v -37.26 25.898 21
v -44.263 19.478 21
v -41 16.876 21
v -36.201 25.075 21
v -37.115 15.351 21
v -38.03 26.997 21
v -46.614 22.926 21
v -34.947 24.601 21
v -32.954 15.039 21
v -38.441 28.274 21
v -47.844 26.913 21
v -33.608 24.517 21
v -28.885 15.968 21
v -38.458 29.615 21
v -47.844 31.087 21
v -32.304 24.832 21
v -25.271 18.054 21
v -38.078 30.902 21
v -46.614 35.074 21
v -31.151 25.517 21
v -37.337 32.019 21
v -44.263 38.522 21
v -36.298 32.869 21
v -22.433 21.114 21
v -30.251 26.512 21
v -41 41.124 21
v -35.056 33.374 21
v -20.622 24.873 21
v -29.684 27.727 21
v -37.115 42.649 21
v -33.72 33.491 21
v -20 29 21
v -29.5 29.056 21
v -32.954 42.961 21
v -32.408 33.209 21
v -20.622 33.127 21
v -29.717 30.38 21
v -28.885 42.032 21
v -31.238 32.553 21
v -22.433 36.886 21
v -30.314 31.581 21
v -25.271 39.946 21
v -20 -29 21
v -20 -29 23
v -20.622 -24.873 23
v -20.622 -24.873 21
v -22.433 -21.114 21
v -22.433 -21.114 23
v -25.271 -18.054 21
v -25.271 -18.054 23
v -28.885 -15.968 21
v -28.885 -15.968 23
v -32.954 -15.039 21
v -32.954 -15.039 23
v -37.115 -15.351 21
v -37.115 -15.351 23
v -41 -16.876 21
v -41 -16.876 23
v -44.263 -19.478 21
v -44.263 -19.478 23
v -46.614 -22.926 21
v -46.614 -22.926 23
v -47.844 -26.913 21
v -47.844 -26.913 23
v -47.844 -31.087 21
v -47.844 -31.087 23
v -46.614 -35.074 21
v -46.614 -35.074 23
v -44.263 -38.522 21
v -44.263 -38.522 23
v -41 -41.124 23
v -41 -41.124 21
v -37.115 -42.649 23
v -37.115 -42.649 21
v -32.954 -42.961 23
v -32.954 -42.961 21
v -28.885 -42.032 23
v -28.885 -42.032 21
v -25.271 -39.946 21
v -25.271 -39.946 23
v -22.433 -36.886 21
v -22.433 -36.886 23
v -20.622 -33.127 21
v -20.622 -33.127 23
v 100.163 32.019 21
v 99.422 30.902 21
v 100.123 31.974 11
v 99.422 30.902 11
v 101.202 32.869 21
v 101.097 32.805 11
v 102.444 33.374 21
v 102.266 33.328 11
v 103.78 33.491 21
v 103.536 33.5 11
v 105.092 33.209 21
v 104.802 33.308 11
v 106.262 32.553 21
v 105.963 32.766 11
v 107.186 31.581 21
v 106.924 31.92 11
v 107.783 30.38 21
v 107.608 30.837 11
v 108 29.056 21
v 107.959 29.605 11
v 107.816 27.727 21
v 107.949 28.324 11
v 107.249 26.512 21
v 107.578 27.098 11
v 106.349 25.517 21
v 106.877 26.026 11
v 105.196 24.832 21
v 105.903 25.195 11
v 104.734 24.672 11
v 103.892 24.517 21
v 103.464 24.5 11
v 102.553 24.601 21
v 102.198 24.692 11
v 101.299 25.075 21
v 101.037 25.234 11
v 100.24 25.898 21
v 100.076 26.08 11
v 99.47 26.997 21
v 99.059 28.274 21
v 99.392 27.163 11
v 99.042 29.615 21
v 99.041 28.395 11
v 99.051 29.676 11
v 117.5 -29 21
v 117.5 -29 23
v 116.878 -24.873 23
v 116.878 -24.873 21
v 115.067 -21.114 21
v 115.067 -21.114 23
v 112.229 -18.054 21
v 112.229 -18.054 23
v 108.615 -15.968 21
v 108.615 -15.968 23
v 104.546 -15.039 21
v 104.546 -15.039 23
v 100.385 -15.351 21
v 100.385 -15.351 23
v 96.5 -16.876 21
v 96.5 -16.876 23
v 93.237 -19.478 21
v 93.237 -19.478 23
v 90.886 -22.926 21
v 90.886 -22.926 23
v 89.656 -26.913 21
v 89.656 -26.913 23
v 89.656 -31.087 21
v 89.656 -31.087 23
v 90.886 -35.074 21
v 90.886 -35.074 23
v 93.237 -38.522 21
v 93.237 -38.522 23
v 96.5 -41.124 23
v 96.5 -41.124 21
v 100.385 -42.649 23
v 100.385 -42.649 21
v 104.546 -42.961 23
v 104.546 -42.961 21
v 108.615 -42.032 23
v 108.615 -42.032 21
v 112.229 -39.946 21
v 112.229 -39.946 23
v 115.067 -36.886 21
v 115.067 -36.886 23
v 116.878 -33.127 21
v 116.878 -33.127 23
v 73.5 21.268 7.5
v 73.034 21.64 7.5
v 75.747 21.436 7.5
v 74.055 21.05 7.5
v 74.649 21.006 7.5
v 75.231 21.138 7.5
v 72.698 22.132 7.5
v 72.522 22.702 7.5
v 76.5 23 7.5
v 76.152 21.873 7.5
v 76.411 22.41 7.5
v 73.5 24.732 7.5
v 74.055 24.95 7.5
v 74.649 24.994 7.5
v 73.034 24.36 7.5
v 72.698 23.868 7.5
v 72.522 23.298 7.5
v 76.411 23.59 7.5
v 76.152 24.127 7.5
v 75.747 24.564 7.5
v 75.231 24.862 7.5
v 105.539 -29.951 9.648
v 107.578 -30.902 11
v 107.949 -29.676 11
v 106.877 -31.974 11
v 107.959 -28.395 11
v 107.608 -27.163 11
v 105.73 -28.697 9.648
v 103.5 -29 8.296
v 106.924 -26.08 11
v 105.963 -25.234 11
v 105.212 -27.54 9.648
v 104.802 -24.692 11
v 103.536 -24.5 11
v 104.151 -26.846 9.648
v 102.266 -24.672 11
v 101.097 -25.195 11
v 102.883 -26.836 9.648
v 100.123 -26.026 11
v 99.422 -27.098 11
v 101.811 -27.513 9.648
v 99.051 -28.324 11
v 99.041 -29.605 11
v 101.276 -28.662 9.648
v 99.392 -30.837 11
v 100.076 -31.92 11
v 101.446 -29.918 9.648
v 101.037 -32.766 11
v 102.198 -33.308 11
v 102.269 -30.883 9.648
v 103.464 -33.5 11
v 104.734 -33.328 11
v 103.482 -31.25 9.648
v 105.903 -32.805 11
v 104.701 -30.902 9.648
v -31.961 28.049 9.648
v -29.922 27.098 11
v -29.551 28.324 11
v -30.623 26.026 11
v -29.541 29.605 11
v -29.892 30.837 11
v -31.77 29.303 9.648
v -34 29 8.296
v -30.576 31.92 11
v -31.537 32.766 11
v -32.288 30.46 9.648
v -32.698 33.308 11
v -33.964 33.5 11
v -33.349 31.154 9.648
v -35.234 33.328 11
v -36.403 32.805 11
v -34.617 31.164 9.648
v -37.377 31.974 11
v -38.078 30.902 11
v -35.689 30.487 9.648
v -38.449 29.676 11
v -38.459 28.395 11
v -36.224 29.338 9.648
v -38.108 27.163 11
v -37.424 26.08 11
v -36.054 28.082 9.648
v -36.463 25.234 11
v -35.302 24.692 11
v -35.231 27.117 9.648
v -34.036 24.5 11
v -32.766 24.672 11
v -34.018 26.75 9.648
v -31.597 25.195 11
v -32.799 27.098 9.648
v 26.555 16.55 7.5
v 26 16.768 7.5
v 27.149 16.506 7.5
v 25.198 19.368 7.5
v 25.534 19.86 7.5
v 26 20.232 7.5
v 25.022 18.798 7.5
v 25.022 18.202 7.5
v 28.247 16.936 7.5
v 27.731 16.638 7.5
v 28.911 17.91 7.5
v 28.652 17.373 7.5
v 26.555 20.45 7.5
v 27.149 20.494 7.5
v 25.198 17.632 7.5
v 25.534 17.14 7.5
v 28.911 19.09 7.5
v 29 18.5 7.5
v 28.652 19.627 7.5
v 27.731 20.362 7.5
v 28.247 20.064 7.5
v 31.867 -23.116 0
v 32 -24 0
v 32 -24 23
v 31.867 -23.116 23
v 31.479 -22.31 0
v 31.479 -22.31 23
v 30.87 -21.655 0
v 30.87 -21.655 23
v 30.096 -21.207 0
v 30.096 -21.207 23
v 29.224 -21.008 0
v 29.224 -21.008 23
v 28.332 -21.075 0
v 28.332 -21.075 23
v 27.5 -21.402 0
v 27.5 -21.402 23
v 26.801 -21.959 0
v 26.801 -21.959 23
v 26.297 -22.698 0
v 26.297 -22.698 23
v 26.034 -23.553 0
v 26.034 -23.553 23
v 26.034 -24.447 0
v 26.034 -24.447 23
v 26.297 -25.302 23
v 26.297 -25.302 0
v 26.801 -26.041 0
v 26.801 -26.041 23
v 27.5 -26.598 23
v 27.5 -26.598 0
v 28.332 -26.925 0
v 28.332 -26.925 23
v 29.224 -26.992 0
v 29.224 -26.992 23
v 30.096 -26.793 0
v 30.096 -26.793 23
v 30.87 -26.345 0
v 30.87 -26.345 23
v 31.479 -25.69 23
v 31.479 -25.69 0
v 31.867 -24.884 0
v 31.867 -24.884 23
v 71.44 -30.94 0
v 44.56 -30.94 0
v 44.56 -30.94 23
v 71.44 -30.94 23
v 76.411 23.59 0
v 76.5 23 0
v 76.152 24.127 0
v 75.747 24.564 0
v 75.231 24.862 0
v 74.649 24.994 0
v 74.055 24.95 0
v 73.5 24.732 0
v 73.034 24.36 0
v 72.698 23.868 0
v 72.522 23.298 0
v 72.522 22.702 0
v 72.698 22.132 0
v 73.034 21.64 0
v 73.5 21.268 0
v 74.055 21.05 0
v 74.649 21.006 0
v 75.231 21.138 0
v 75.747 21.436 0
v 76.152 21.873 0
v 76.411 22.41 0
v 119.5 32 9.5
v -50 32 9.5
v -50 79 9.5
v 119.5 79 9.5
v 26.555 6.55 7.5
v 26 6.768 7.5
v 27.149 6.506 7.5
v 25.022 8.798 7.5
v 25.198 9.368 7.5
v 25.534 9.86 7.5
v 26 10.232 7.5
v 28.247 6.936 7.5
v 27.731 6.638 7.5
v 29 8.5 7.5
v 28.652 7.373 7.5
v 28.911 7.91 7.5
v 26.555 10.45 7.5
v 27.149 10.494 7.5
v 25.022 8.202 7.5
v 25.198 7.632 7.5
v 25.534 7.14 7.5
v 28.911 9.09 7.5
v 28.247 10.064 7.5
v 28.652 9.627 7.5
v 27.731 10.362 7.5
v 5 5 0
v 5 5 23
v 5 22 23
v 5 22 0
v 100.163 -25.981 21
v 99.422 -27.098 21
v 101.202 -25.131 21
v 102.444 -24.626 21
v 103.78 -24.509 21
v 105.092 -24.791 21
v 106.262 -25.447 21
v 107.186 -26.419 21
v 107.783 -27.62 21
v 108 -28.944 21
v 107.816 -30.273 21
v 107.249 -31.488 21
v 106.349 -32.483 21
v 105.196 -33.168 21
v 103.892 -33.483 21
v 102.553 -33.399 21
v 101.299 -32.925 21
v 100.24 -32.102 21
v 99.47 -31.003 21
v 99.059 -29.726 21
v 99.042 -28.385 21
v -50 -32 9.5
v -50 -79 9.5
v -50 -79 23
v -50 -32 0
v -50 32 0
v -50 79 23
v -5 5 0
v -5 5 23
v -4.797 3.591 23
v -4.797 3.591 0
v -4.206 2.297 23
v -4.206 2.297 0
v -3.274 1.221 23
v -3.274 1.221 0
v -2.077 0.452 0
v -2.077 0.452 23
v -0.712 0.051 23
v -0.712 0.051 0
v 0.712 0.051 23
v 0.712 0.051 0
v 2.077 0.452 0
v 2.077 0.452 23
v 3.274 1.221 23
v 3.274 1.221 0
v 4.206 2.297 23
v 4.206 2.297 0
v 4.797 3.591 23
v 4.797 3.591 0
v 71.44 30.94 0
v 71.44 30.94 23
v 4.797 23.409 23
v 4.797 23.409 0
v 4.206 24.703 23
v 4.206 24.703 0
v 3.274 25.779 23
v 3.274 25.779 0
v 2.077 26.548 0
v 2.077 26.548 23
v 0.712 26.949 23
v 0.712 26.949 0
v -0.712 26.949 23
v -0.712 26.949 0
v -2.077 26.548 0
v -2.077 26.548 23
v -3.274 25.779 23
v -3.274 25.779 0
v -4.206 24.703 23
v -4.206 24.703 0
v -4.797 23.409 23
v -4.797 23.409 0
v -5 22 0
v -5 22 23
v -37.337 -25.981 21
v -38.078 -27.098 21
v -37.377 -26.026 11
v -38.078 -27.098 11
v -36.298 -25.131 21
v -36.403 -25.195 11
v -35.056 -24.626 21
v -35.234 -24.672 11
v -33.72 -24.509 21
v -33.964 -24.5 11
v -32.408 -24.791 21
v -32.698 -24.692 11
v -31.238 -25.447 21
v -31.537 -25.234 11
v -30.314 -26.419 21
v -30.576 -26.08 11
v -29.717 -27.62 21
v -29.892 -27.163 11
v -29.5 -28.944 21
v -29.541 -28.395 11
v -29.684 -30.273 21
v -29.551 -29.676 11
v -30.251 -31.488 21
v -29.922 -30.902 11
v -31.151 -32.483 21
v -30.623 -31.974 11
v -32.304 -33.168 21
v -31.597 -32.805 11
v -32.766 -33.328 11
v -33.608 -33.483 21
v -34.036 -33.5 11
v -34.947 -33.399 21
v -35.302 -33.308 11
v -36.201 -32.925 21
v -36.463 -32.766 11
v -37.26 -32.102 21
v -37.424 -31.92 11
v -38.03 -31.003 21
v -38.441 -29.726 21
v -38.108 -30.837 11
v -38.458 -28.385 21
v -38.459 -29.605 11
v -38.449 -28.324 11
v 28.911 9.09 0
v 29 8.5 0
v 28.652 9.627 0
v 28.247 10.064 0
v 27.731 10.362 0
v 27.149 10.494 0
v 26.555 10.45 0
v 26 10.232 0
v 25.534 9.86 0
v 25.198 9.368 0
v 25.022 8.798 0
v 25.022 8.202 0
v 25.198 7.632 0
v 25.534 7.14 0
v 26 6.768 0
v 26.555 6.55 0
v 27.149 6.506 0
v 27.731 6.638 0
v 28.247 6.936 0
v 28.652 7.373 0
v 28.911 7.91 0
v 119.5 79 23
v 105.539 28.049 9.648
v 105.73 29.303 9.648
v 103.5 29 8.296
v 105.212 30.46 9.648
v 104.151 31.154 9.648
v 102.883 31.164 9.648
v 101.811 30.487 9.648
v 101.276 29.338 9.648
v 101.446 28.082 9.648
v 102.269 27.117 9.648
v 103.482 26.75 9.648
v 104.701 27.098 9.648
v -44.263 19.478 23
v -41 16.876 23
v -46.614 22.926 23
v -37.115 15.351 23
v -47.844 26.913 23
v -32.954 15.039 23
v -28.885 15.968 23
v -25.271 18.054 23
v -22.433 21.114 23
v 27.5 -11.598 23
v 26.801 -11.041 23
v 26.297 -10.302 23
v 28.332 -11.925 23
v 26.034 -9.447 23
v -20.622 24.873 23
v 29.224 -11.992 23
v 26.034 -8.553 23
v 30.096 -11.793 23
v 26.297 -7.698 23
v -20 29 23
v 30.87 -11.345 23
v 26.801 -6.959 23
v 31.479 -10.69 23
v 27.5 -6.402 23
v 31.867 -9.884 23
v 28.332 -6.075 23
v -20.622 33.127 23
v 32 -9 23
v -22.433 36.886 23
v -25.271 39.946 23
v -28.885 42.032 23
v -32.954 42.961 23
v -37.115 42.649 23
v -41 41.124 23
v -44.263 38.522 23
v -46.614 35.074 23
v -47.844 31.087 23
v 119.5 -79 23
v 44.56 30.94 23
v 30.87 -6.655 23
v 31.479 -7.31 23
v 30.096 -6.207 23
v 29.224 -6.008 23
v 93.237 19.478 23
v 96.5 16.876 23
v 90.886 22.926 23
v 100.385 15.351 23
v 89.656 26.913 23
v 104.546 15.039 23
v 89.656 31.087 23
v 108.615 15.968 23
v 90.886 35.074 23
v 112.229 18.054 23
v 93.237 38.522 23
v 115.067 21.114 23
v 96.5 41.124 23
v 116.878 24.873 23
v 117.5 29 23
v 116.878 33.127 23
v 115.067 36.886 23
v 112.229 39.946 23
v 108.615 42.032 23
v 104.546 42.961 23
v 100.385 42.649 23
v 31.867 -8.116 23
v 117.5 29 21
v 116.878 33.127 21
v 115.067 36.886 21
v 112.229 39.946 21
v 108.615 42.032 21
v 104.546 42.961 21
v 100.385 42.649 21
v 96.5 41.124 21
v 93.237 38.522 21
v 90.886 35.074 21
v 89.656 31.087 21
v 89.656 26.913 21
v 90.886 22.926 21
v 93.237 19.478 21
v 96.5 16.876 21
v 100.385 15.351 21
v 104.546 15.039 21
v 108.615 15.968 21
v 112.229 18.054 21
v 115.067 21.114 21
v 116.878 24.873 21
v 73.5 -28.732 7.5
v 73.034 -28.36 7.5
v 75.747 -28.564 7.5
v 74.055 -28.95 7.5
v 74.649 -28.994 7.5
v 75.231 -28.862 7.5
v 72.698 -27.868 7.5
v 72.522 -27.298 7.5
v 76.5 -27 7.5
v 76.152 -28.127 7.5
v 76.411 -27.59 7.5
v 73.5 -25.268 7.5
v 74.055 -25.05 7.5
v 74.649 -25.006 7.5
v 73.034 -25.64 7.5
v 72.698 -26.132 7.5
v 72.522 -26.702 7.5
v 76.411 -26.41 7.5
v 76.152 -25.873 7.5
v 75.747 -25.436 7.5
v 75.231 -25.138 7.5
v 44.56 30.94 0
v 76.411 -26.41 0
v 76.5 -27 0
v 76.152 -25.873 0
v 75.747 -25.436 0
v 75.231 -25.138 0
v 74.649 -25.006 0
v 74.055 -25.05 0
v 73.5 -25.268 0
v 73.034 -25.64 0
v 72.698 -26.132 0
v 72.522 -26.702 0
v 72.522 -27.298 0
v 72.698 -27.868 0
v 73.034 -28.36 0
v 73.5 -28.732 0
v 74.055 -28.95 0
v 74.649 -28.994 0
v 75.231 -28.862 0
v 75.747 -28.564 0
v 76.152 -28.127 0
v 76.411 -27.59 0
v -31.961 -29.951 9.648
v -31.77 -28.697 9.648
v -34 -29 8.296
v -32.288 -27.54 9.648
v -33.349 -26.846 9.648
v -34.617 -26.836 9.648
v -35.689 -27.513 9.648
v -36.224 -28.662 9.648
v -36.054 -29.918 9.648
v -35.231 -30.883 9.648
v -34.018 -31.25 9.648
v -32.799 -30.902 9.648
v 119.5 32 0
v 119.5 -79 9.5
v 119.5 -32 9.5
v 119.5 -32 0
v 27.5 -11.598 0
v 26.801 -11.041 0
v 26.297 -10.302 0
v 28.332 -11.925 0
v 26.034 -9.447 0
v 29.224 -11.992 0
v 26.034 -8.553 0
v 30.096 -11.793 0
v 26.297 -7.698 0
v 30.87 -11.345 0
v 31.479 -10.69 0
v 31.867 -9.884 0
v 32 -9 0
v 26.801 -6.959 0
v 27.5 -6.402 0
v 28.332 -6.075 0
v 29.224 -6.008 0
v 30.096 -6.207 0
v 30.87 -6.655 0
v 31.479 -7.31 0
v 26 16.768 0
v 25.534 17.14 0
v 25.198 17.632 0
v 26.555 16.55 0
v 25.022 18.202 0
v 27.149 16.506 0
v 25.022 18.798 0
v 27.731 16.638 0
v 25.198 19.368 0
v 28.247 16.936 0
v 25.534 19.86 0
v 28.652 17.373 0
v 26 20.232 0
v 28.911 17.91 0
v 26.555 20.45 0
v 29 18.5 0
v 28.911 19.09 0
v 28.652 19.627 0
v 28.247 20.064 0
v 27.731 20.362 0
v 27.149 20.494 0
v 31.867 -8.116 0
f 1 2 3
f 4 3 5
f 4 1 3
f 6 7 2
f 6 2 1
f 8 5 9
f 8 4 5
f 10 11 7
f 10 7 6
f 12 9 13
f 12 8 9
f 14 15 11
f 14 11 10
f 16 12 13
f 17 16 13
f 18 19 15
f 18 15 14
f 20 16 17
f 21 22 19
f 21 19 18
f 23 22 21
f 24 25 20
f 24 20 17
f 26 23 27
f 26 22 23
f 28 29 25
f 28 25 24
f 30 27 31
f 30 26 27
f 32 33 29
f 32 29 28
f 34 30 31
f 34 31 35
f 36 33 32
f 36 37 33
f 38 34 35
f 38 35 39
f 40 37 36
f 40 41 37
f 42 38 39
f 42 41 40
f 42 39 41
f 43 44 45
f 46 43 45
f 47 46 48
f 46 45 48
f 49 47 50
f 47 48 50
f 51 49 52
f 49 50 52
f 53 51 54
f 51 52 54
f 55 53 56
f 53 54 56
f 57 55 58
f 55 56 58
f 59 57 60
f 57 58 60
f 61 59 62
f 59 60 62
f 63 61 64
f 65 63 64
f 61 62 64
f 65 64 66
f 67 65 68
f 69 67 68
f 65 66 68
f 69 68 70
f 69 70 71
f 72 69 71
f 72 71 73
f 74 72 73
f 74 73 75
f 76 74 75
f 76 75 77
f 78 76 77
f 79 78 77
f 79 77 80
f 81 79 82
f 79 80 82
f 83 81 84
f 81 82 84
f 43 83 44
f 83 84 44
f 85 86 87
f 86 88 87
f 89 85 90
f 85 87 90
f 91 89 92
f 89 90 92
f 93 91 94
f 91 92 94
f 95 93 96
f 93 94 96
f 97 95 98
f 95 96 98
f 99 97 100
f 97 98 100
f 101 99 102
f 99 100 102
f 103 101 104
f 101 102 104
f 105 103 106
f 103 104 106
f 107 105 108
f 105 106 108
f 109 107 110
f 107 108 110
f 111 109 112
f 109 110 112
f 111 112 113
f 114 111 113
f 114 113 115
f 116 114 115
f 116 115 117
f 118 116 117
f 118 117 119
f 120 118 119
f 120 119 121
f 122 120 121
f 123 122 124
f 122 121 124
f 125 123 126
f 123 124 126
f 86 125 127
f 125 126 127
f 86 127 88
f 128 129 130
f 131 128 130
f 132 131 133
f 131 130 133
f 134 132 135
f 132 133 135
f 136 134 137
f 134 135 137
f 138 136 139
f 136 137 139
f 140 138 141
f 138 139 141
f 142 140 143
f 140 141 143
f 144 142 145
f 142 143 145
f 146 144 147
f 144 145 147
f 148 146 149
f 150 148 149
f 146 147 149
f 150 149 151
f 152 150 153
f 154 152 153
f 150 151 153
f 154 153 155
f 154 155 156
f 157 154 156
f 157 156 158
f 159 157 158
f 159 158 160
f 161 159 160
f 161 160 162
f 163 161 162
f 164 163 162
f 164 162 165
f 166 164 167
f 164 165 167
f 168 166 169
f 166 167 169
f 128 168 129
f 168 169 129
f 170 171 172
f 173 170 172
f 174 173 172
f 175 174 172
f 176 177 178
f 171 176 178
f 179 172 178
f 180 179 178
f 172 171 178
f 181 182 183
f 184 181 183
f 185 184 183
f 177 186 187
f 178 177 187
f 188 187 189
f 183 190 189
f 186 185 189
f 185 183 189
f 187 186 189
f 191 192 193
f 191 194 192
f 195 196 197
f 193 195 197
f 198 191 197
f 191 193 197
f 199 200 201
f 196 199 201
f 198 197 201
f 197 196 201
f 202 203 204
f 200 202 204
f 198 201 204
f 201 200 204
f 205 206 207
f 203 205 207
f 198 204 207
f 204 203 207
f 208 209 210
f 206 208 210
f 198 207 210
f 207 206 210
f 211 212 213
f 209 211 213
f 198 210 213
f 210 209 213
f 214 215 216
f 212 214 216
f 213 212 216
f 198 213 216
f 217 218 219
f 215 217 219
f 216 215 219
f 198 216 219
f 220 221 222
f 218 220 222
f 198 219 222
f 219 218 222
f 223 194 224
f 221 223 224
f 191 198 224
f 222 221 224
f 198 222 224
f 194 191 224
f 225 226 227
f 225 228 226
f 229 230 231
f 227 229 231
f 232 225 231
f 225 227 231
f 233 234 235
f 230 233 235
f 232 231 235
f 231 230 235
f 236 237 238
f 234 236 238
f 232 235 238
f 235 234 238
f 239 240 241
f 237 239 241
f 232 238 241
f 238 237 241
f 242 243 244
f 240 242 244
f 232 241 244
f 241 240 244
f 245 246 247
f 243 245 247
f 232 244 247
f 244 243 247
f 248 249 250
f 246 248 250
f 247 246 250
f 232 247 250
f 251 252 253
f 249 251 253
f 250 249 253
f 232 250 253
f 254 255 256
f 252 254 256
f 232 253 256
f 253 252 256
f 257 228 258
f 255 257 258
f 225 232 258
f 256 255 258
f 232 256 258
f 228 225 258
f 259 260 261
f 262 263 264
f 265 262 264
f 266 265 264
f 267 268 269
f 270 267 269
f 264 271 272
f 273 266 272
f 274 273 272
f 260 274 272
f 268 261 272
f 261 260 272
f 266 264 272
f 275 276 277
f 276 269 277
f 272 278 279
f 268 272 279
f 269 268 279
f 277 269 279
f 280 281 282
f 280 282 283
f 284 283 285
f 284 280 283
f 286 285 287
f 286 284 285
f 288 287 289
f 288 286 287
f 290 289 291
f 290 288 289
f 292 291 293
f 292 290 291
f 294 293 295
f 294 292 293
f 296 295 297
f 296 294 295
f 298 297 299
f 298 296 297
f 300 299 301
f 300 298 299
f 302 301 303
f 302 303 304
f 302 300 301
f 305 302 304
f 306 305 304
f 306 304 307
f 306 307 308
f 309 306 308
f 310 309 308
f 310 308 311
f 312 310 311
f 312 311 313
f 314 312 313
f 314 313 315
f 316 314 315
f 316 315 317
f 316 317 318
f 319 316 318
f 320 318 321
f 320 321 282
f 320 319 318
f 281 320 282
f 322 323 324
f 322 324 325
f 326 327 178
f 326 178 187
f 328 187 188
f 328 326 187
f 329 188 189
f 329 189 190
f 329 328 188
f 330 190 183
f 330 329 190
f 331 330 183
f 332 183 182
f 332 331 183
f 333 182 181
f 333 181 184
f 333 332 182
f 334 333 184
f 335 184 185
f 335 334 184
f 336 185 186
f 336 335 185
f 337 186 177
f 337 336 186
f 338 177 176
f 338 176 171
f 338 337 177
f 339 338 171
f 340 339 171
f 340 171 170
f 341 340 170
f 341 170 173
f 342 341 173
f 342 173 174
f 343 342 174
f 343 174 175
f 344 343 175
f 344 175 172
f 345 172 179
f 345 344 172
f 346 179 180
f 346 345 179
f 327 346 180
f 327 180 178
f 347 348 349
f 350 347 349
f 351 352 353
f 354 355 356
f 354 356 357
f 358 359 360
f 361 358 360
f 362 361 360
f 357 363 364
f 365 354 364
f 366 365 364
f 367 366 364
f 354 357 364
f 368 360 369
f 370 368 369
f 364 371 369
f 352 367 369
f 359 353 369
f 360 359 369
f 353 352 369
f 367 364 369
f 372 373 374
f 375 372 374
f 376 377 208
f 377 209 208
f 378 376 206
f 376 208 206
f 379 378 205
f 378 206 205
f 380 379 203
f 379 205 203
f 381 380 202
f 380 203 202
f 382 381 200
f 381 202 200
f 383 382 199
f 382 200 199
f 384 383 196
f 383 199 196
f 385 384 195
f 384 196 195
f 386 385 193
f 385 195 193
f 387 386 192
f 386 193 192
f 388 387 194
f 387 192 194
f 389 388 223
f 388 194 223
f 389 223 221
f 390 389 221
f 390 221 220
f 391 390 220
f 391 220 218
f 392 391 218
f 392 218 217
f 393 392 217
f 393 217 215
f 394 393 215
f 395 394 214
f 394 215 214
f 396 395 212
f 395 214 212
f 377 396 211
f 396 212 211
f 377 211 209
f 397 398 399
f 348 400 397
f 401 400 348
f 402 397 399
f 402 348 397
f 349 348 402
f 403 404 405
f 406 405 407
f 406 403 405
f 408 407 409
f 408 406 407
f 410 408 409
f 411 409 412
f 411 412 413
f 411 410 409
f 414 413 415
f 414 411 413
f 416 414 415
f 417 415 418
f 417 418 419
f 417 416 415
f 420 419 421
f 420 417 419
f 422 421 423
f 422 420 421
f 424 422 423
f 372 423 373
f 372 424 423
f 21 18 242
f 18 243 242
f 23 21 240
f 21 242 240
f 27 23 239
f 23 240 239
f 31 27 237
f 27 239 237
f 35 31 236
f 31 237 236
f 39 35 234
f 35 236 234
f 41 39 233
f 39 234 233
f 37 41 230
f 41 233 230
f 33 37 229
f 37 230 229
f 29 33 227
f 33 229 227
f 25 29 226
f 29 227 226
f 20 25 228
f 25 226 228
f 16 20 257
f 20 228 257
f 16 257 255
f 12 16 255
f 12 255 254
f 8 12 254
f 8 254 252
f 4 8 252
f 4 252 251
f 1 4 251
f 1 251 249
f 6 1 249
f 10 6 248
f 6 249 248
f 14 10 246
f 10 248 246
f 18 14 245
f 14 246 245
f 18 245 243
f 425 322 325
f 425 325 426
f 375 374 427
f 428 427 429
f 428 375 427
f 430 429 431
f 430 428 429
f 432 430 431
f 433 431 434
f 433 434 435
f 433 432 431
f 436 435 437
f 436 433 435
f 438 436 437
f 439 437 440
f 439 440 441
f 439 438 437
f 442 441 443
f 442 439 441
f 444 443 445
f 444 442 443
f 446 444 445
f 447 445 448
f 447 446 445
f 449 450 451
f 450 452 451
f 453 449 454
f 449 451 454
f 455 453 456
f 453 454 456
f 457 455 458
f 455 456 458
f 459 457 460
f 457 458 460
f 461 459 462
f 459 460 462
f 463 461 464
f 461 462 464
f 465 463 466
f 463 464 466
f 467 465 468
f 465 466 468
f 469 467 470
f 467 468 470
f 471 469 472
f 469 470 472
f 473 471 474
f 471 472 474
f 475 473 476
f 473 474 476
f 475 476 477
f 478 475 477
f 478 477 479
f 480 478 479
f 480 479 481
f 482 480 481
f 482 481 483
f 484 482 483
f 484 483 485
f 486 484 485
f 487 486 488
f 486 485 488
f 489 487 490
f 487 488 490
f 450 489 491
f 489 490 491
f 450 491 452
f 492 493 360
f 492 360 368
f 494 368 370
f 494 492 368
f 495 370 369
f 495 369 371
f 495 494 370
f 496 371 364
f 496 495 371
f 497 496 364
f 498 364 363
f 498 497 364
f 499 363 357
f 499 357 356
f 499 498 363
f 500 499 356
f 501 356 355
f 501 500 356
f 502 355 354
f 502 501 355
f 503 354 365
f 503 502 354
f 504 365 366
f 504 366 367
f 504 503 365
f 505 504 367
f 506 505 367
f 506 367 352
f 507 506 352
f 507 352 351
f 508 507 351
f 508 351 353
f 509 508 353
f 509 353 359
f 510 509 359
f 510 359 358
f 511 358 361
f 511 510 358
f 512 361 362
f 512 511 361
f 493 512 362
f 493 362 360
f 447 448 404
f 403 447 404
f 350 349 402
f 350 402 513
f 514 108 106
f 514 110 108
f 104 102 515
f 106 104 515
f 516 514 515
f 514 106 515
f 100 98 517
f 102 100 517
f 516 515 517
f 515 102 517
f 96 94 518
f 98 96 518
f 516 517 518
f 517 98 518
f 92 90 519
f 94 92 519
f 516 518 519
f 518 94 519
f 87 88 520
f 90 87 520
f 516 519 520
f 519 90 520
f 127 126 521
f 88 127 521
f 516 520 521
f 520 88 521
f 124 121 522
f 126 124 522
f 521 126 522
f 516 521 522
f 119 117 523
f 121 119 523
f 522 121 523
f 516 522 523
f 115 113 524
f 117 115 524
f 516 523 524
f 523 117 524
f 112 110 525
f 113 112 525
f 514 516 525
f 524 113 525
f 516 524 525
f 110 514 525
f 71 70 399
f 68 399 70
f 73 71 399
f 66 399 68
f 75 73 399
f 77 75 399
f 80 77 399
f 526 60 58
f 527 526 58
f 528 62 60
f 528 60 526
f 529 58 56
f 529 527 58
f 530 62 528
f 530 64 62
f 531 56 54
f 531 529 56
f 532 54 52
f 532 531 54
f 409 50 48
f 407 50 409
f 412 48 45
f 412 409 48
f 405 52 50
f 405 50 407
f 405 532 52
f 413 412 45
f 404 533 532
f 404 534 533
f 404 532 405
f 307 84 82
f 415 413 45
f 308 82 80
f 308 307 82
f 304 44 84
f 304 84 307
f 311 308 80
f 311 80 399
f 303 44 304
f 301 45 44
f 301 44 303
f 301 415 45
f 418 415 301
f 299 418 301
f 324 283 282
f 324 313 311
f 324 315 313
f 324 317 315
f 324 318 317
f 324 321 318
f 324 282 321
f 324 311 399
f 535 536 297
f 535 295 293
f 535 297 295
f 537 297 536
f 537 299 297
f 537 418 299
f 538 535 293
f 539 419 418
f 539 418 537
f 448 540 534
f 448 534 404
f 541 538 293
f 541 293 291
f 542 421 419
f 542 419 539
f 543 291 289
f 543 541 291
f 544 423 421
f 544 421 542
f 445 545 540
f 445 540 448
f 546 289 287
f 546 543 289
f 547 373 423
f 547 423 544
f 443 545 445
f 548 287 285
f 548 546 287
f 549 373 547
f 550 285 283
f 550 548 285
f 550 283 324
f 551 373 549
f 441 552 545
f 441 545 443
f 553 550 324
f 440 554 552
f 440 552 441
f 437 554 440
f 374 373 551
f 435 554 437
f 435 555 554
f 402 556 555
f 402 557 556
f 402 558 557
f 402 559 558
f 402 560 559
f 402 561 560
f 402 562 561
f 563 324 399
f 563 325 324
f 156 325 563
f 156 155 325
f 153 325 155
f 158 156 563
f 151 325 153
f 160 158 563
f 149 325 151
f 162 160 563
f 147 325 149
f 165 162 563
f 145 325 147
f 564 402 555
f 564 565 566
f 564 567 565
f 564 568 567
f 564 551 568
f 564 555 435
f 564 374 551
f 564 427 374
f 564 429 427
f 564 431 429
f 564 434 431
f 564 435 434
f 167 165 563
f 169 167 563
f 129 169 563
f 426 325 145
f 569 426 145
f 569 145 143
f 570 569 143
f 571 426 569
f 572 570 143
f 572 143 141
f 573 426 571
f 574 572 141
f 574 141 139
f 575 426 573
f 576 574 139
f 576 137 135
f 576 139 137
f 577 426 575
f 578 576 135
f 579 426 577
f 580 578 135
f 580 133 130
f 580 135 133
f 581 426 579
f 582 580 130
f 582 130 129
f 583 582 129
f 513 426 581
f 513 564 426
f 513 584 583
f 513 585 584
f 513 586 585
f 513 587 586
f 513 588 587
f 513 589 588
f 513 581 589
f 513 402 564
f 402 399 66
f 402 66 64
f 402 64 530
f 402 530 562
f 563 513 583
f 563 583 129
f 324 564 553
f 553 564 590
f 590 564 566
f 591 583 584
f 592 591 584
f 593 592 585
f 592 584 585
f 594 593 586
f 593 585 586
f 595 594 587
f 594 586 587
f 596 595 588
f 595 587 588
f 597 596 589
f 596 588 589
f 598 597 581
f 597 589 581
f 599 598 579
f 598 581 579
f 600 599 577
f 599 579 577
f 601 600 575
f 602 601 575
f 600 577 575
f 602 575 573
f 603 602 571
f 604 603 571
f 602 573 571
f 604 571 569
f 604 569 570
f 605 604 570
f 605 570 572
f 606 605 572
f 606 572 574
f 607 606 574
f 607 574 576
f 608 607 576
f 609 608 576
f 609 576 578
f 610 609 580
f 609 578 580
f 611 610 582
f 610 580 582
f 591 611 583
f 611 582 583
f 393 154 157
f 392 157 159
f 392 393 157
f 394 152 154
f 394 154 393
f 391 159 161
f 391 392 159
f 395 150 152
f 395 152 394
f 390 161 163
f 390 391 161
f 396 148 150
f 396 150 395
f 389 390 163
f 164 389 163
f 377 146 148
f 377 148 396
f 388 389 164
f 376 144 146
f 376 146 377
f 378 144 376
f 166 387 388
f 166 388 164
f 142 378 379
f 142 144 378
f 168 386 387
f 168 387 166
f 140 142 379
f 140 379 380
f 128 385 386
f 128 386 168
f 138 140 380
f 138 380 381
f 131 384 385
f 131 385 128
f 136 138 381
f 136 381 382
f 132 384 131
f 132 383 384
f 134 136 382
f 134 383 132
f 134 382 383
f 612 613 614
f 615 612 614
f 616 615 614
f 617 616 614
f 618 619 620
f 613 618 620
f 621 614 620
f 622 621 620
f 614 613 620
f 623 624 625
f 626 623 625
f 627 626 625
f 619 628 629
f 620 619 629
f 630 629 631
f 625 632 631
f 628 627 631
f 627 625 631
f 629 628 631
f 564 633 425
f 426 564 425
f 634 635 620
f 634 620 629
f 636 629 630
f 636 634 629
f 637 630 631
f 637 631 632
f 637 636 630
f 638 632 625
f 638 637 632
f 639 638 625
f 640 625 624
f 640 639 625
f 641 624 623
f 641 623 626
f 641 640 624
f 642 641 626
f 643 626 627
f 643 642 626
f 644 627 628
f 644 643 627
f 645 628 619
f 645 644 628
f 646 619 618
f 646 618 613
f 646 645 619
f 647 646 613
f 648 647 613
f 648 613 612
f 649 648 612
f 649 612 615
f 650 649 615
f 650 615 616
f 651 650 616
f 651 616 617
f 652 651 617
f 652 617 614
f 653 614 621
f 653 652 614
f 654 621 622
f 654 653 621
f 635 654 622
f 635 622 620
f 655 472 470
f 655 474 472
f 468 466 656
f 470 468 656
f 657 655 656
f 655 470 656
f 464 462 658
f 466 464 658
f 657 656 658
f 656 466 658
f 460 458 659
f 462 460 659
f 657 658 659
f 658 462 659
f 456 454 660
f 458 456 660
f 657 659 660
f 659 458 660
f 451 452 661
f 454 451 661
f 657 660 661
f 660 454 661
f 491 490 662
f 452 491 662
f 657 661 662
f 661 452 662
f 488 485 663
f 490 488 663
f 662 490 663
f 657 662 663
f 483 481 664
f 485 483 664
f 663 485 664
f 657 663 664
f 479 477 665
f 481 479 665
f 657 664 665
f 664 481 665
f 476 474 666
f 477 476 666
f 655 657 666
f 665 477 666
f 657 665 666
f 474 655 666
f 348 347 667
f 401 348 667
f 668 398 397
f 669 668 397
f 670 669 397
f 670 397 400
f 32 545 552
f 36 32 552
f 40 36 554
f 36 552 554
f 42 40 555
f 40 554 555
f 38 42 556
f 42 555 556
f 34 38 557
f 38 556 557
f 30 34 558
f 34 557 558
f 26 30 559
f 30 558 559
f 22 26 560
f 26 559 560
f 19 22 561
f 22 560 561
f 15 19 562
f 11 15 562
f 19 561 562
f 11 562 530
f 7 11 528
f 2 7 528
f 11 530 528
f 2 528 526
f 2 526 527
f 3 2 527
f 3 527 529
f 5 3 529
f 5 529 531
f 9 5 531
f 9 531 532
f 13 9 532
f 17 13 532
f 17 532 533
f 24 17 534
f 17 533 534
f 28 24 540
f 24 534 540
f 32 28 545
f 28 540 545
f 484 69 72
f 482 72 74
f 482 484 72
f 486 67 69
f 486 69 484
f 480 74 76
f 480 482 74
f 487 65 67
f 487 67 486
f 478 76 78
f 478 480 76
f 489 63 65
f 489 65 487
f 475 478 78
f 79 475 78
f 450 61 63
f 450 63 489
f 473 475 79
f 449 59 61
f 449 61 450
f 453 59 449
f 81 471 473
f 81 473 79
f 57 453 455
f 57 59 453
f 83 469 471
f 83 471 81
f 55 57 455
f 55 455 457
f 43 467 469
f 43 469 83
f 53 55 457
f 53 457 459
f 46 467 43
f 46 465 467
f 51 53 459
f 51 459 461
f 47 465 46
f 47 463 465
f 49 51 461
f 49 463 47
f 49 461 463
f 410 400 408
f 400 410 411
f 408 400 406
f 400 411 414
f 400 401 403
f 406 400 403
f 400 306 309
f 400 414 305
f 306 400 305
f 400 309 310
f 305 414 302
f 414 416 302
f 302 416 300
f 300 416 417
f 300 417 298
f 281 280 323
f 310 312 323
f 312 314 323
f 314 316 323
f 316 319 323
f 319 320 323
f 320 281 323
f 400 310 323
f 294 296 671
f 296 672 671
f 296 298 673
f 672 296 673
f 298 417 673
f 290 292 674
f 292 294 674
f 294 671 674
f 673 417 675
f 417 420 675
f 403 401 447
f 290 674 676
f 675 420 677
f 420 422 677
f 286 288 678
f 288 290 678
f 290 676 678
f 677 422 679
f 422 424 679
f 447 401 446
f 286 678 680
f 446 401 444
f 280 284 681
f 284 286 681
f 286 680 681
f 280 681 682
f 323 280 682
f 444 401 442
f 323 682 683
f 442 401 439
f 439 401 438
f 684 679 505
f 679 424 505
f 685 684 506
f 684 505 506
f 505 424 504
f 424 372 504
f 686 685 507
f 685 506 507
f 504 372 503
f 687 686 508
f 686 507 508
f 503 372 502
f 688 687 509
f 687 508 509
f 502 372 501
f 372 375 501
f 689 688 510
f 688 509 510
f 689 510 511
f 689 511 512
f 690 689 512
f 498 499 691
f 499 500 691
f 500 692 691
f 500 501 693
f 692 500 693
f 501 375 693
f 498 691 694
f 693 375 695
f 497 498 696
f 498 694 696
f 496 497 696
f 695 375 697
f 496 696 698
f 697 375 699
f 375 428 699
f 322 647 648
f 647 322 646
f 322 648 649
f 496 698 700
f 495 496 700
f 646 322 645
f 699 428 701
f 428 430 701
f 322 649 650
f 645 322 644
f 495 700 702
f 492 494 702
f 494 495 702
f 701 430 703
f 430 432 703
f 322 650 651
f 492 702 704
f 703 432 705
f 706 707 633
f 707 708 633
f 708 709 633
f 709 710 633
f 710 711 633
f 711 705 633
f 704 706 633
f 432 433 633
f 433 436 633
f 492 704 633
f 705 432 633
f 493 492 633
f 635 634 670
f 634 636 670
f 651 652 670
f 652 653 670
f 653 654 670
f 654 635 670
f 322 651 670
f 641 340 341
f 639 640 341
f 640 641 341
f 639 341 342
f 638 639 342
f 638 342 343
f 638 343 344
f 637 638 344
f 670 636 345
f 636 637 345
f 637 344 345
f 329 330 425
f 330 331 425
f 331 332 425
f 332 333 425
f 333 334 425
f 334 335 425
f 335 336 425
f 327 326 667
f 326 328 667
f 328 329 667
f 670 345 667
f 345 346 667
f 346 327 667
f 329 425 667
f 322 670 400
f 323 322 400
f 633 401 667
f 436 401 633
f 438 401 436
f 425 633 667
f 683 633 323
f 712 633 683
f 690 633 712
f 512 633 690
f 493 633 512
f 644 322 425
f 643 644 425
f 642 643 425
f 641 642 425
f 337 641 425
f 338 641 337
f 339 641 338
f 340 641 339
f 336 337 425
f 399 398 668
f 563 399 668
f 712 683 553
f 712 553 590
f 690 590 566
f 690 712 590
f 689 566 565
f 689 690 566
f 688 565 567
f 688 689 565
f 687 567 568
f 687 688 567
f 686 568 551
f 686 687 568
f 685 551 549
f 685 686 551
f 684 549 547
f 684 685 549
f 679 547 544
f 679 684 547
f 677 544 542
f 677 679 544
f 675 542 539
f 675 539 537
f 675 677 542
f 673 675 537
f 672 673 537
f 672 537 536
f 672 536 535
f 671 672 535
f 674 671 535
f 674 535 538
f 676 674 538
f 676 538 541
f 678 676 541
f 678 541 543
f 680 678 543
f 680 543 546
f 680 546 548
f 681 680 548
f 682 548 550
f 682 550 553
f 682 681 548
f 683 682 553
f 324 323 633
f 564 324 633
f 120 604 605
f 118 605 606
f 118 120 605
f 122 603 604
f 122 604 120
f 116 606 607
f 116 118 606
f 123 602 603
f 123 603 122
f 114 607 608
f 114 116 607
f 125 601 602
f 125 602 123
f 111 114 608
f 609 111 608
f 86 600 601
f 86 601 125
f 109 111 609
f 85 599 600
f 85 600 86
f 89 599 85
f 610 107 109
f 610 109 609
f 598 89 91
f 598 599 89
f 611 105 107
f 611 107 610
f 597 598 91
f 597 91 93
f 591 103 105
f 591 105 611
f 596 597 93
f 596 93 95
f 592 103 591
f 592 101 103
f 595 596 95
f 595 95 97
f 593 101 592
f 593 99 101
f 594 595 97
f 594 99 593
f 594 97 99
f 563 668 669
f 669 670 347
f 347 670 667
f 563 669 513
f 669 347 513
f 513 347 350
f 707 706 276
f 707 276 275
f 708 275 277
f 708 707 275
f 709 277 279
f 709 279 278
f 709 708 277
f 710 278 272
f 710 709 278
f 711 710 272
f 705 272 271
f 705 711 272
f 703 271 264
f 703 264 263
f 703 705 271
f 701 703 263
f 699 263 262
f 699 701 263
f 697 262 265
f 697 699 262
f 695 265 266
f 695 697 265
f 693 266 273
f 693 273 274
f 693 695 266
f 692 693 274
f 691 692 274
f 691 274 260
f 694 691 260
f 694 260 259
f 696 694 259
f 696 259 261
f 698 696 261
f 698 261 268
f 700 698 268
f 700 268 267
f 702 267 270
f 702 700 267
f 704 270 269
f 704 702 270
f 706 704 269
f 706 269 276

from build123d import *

# Parameters (mm, degrees)
SKETCH2_W                  = 169.5
SKETCH2_H                  = 158
SKETCH2_R                  = 3
SKETCH2_W_2                = 26.88
SKETCH2_H_2                = 61.88
BOSS_EXTRUDE1_DEPTH        = 23
CUT_EXTRUDE1_DEPTH         = 189.415100244
CUT_EXTRUDE1_DEPTH_BACK    = 189.415100244
SKETCH3_W                  = 9.5
SKETCH3_H                  = 47
SKETCH4_R                  = 2
CUT_EXTRUDE2_DEPTH         = 7.5
SKETCH6_R                  = 14
CUT_EXTRUDE4_DEPTH         = 2
M10X1_0_TAPPED_HOLE1_D     = 9
M10X1_0_TAPPED_HOLE1_DEPTH = 10
M10X1_0_TAPPED_HOLE1_TIP   = 2.703872786


with BuildPart() as part:
    # Sketch2 → Boss-Extrude1 (new body)
    with BuildSketch(Plane.XY):
        with Locations((34.75, 0)):
            Rectangle(SKETCH2_W, SKETCH2_H)
        with Locations((29, -9)):
            Circle(SKETCH2_R, mode=Mode.SUBTRACT)
        with Locations((29, -24)):
            Circle(SKETCH2_R, mode=Mode.SUBTRACT)
        with BuildLine():
            Line((-5, 22), (-5, 5))
            ThreePointArc((-5, 5), (0, 0), (5, 5))
            Line((5, 5), (5, 22))
            ThreePointArc((5, 22), (0, 27), (-5, 22))
        make_face(mode=Mode.SUBTRACT)
        with Locations((58, 0)):
            Rectangle(SKETCH2_W_2, SKETCH2_H_2, mode=Mode.SUBTRACT)
    extrude(amount=BOSS_EXTRUDE1_DEPTH)

    # Sketch3 → Cut-Extrude1 (cut, two sides: drawn at the far end of the back side and taken through both)
    with BuildSketch(Plane(origin=(119.5, 0, 0), x_dir=(0, 0, -1), z_dir=(1, 0, 0)).offset(-CUT_EXTRUDE1_DEPTH_BACK)):
        with Locations((-4.75, 55.5)):
            Rectangle(SKETCH3_W, SKETCH3_H)
        with Locations((-4.75, -55.5)):
            Rectangle(SKETCH3_W, SKETCH3_H)
    extrude(amount=CUT_EXTRUDE1_DEPTH + CUT_EXTRUDE1_DEPTH_BACK, mode=Mode.SUBTRACT)

    # Sketch4 → Cut-Extrude2 (cut)
    with BuildSketch(Plane.XY):
        with Locations((74.5, -27)):
            Circle(SKETCH4_R)
        with Locations((74.5, 23)):
            Circle(SKETCH4_R)
        with Locations((27, 18.5)):
            Circle(SKETCH4_R)
        with Locations((27, 8.5)):
            Circle(SKETCH4_R)
    extrude(amount=CUT_EXTRUDE2_DEPTH, mode=Mode.SUBTRACT)

    # Sketch6 → Cut-Extrude4 (cut)
    with BuildSketch(Plane.XY.offset(23)):
        with Locations((103.5, 29)):
            Circle(SKETCH6_R)
        with Locations((103.5, -29)):
            Circle(SKETCH6_R)
        with Locations((-34, 29)):
            Circle(SKETCH6_R)
        with Locations((-34, -29)):
            Circle(SKETCH6_R)
    extrude(amount=-CUT_EXTRUDE4_DEPTH, mode=Mode.SUBTRACT)

    # M10x1.0 Tapped Hole1
    with Locations(Plane(origin=(0, 0, 21), x_dir=(0.9063077870366375, -0.42261826174072625, 0), z_dir=(0, 0, 1))):
        with Locations((-43.07039435, 11.913904925), (-18.558535169, -40.651946723), (81.546926368, 70.023915914), (106.058785549, 17.458064266)):
            Hole(M10X1_0_TAPPED_HOLE1_D / 2, depth=M10X1_0_TAPPED_HOLE1_DEPTH)
            with Locations((0, 0, -(M10X1_0_TAPPED_HOLE1_DEPTH + M10X1_0_TAPPED_HOLE1_TIP / 2))):  # 118° drill point
                Cone(0, M10X1_0_TAPPED_HOLE1_D / 2, M10X1_0_TAPPED_HOLE1_TIP, mode=Mode.SUBTRACT)


solid = part.part
